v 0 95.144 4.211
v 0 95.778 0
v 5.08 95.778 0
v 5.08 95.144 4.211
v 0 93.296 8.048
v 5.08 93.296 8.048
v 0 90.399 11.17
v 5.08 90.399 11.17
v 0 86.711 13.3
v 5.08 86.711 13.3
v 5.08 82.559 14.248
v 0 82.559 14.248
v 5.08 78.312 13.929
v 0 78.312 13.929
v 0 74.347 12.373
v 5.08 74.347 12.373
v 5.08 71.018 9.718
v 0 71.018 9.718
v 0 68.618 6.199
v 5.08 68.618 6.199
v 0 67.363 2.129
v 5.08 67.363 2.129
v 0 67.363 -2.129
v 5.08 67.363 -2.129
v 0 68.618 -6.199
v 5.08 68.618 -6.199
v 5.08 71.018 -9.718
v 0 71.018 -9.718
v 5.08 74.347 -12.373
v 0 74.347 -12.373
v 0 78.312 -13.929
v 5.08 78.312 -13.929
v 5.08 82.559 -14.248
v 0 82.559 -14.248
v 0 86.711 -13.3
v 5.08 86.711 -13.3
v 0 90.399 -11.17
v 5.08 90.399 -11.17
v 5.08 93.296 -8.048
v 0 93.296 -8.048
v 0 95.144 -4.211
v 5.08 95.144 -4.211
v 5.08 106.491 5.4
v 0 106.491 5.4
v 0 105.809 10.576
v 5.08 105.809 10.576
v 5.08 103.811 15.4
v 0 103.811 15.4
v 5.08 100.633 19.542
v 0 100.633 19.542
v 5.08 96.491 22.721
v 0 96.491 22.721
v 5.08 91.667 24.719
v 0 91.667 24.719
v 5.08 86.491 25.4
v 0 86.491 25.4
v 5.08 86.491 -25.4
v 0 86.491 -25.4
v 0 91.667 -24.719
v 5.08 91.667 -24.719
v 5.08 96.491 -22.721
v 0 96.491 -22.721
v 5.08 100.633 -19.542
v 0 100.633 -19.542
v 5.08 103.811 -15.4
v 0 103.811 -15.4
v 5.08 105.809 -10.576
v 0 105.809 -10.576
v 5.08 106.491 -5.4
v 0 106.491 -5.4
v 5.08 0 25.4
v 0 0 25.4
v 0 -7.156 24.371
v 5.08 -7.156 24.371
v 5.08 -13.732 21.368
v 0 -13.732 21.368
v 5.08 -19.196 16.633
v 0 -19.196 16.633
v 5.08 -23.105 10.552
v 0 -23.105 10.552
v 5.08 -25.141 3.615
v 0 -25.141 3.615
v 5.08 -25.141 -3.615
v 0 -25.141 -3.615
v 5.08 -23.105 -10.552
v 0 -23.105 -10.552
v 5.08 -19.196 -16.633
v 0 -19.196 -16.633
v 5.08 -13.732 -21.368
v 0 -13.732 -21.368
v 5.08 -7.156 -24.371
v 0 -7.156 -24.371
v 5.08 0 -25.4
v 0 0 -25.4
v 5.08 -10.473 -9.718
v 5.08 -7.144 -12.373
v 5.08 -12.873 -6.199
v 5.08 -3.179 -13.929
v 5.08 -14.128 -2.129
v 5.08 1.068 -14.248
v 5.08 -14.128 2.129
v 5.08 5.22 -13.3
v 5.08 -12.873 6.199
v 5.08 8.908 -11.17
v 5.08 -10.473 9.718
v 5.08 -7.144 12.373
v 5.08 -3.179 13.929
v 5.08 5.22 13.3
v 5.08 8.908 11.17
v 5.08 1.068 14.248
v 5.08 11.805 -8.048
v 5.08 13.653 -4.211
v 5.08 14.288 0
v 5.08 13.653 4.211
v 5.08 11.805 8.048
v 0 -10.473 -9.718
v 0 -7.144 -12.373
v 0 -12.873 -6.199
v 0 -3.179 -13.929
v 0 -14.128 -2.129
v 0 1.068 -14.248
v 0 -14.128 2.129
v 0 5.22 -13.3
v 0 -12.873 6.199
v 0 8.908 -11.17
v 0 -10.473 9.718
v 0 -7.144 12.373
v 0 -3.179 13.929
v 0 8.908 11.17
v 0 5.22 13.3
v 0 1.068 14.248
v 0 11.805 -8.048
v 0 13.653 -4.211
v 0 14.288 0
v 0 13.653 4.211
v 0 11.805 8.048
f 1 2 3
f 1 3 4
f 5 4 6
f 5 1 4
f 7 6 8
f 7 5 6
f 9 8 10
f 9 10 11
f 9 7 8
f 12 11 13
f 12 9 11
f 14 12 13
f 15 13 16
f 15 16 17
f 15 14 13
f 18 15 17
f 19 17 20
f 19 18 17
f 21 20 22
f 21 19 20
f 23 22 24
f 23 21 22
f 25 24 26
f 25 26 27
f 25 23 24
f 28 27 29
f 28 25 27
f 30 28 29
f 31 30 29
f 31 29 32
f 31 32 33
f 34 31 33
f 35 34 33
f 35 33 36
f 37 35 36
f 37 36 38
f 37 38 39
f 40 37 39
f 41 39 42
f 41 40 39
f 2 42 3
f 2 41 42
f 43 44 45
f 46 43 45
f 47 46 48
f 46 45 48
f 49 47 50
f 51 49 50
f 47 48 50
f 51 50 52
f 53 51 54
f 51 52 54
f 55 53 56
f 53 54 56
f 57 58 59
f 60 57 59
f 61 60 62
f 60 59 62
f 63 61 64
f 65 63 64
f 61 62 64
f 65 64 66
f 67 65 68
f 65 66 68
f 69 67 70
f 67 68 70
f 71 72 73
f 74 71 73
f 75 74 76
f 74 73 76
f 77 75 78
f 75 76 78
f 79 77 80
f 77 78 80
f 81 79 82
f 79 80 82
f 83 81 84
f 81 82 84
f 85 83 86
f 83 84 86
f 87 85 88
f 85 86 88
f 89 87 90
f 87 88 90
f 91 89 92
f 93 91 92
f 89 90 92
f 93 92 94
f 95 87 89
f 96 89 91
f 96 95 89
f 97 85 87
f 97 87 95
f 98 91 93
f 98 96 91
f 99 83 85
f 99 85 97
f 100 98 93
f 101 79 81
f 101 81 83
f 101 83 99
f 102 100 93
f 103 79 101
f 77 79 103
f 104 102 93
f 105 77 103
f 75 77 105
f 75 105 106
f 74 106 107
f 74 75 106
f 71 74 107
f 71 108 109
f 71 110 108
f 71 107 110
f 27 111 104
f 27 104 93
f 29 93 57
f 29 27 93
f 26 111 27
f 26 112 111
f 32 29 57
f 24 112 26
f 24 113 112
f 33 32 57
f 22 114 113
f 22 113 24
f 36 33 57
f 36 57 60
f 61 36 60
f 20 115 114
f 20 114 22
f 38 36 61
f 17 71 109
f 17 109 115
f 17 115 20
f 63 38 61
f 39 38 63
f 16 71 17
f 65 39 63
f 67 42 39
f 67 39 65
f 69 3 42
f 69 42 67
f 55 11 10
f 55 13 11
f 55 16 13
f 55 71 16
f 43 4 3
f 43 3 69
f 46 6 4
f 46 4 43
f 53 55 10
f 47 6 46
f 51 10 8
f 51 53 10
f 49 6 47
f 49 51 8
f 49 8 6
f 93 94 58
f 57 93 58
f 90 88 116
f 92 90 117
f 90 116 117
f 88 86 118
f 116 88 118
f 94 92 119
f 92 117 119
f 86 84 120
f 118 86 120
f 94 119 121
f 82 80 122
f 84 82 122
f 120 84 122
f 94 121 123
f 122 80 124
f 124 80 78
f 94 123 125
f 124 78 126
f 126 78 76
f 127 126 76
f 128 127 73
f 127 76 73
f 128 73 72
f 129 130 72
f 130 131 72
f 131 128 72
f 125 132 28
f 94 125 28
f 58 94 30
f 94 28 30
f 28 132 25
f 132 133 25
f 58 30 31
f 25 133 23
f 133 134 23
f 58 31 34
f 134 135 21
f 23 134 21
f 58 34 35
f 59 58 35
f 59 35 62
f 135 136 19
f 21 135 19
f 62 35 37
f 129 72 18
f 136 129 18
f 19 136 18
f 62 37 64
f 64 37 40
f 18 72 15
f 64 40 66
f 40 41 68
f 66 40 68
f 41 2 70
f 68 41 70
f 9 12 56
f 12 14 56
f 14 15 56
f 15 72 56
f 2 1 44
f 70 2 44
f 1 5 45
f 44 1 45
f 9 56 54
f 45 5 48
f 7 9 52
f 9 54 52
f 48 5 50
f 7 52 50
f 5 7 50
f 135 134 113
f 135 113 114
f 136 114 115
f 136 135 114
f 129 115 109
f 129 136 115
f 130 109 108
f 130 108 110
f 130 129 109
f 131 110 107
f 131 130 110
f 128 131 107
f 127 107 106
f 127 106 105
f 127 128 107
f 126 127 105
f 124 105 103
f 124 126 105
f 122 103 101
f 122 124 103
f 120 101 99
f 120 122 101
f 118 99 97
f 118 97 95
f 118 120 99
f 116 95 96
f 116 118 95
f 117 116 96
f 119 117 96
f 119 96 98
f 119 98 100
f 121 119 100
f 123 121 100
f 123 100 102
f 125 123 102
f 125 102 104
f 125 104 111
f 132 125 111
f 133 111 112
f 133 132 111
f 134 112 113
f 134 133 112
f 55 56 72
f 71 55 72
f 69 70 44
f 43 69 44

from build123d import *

# Parameters (mm, degrees)
F0_R     = 14.2875
F1_DEPTH = 5.08


with BuildPart() as f1:
    # F0 (on Right) → F1 (new body)
    with BuildSketch(Plane.YZ):
        with BuildLine():
            Line((86.49098, 25.4), (0, 25.4))
            ThreePointArc((0, 25.4), (-25.4, 0), (0, -25.4))
            Line((0, -25.4), (86.49098, -25.4))
            ThreePointArc((86.49098, -25.4), (100.633116, -19.542136), (106.49098, -5.4))
            Line((106.49098, -5.4), (106.49098, 5.4))
            ThreePointArc((106.49098, 5.4), (100.633116, 19.542136), (86.49098, 25.4))
        make_face()
        Circle(F0_R, mode=Mode.SUBTRACT)
        with Locations((81.49098, 0)):
            Circle(F0_R, mode=Mode.SUBTRACT)
    extrude(amount=F1_DEPTH)


solid = f1.part
